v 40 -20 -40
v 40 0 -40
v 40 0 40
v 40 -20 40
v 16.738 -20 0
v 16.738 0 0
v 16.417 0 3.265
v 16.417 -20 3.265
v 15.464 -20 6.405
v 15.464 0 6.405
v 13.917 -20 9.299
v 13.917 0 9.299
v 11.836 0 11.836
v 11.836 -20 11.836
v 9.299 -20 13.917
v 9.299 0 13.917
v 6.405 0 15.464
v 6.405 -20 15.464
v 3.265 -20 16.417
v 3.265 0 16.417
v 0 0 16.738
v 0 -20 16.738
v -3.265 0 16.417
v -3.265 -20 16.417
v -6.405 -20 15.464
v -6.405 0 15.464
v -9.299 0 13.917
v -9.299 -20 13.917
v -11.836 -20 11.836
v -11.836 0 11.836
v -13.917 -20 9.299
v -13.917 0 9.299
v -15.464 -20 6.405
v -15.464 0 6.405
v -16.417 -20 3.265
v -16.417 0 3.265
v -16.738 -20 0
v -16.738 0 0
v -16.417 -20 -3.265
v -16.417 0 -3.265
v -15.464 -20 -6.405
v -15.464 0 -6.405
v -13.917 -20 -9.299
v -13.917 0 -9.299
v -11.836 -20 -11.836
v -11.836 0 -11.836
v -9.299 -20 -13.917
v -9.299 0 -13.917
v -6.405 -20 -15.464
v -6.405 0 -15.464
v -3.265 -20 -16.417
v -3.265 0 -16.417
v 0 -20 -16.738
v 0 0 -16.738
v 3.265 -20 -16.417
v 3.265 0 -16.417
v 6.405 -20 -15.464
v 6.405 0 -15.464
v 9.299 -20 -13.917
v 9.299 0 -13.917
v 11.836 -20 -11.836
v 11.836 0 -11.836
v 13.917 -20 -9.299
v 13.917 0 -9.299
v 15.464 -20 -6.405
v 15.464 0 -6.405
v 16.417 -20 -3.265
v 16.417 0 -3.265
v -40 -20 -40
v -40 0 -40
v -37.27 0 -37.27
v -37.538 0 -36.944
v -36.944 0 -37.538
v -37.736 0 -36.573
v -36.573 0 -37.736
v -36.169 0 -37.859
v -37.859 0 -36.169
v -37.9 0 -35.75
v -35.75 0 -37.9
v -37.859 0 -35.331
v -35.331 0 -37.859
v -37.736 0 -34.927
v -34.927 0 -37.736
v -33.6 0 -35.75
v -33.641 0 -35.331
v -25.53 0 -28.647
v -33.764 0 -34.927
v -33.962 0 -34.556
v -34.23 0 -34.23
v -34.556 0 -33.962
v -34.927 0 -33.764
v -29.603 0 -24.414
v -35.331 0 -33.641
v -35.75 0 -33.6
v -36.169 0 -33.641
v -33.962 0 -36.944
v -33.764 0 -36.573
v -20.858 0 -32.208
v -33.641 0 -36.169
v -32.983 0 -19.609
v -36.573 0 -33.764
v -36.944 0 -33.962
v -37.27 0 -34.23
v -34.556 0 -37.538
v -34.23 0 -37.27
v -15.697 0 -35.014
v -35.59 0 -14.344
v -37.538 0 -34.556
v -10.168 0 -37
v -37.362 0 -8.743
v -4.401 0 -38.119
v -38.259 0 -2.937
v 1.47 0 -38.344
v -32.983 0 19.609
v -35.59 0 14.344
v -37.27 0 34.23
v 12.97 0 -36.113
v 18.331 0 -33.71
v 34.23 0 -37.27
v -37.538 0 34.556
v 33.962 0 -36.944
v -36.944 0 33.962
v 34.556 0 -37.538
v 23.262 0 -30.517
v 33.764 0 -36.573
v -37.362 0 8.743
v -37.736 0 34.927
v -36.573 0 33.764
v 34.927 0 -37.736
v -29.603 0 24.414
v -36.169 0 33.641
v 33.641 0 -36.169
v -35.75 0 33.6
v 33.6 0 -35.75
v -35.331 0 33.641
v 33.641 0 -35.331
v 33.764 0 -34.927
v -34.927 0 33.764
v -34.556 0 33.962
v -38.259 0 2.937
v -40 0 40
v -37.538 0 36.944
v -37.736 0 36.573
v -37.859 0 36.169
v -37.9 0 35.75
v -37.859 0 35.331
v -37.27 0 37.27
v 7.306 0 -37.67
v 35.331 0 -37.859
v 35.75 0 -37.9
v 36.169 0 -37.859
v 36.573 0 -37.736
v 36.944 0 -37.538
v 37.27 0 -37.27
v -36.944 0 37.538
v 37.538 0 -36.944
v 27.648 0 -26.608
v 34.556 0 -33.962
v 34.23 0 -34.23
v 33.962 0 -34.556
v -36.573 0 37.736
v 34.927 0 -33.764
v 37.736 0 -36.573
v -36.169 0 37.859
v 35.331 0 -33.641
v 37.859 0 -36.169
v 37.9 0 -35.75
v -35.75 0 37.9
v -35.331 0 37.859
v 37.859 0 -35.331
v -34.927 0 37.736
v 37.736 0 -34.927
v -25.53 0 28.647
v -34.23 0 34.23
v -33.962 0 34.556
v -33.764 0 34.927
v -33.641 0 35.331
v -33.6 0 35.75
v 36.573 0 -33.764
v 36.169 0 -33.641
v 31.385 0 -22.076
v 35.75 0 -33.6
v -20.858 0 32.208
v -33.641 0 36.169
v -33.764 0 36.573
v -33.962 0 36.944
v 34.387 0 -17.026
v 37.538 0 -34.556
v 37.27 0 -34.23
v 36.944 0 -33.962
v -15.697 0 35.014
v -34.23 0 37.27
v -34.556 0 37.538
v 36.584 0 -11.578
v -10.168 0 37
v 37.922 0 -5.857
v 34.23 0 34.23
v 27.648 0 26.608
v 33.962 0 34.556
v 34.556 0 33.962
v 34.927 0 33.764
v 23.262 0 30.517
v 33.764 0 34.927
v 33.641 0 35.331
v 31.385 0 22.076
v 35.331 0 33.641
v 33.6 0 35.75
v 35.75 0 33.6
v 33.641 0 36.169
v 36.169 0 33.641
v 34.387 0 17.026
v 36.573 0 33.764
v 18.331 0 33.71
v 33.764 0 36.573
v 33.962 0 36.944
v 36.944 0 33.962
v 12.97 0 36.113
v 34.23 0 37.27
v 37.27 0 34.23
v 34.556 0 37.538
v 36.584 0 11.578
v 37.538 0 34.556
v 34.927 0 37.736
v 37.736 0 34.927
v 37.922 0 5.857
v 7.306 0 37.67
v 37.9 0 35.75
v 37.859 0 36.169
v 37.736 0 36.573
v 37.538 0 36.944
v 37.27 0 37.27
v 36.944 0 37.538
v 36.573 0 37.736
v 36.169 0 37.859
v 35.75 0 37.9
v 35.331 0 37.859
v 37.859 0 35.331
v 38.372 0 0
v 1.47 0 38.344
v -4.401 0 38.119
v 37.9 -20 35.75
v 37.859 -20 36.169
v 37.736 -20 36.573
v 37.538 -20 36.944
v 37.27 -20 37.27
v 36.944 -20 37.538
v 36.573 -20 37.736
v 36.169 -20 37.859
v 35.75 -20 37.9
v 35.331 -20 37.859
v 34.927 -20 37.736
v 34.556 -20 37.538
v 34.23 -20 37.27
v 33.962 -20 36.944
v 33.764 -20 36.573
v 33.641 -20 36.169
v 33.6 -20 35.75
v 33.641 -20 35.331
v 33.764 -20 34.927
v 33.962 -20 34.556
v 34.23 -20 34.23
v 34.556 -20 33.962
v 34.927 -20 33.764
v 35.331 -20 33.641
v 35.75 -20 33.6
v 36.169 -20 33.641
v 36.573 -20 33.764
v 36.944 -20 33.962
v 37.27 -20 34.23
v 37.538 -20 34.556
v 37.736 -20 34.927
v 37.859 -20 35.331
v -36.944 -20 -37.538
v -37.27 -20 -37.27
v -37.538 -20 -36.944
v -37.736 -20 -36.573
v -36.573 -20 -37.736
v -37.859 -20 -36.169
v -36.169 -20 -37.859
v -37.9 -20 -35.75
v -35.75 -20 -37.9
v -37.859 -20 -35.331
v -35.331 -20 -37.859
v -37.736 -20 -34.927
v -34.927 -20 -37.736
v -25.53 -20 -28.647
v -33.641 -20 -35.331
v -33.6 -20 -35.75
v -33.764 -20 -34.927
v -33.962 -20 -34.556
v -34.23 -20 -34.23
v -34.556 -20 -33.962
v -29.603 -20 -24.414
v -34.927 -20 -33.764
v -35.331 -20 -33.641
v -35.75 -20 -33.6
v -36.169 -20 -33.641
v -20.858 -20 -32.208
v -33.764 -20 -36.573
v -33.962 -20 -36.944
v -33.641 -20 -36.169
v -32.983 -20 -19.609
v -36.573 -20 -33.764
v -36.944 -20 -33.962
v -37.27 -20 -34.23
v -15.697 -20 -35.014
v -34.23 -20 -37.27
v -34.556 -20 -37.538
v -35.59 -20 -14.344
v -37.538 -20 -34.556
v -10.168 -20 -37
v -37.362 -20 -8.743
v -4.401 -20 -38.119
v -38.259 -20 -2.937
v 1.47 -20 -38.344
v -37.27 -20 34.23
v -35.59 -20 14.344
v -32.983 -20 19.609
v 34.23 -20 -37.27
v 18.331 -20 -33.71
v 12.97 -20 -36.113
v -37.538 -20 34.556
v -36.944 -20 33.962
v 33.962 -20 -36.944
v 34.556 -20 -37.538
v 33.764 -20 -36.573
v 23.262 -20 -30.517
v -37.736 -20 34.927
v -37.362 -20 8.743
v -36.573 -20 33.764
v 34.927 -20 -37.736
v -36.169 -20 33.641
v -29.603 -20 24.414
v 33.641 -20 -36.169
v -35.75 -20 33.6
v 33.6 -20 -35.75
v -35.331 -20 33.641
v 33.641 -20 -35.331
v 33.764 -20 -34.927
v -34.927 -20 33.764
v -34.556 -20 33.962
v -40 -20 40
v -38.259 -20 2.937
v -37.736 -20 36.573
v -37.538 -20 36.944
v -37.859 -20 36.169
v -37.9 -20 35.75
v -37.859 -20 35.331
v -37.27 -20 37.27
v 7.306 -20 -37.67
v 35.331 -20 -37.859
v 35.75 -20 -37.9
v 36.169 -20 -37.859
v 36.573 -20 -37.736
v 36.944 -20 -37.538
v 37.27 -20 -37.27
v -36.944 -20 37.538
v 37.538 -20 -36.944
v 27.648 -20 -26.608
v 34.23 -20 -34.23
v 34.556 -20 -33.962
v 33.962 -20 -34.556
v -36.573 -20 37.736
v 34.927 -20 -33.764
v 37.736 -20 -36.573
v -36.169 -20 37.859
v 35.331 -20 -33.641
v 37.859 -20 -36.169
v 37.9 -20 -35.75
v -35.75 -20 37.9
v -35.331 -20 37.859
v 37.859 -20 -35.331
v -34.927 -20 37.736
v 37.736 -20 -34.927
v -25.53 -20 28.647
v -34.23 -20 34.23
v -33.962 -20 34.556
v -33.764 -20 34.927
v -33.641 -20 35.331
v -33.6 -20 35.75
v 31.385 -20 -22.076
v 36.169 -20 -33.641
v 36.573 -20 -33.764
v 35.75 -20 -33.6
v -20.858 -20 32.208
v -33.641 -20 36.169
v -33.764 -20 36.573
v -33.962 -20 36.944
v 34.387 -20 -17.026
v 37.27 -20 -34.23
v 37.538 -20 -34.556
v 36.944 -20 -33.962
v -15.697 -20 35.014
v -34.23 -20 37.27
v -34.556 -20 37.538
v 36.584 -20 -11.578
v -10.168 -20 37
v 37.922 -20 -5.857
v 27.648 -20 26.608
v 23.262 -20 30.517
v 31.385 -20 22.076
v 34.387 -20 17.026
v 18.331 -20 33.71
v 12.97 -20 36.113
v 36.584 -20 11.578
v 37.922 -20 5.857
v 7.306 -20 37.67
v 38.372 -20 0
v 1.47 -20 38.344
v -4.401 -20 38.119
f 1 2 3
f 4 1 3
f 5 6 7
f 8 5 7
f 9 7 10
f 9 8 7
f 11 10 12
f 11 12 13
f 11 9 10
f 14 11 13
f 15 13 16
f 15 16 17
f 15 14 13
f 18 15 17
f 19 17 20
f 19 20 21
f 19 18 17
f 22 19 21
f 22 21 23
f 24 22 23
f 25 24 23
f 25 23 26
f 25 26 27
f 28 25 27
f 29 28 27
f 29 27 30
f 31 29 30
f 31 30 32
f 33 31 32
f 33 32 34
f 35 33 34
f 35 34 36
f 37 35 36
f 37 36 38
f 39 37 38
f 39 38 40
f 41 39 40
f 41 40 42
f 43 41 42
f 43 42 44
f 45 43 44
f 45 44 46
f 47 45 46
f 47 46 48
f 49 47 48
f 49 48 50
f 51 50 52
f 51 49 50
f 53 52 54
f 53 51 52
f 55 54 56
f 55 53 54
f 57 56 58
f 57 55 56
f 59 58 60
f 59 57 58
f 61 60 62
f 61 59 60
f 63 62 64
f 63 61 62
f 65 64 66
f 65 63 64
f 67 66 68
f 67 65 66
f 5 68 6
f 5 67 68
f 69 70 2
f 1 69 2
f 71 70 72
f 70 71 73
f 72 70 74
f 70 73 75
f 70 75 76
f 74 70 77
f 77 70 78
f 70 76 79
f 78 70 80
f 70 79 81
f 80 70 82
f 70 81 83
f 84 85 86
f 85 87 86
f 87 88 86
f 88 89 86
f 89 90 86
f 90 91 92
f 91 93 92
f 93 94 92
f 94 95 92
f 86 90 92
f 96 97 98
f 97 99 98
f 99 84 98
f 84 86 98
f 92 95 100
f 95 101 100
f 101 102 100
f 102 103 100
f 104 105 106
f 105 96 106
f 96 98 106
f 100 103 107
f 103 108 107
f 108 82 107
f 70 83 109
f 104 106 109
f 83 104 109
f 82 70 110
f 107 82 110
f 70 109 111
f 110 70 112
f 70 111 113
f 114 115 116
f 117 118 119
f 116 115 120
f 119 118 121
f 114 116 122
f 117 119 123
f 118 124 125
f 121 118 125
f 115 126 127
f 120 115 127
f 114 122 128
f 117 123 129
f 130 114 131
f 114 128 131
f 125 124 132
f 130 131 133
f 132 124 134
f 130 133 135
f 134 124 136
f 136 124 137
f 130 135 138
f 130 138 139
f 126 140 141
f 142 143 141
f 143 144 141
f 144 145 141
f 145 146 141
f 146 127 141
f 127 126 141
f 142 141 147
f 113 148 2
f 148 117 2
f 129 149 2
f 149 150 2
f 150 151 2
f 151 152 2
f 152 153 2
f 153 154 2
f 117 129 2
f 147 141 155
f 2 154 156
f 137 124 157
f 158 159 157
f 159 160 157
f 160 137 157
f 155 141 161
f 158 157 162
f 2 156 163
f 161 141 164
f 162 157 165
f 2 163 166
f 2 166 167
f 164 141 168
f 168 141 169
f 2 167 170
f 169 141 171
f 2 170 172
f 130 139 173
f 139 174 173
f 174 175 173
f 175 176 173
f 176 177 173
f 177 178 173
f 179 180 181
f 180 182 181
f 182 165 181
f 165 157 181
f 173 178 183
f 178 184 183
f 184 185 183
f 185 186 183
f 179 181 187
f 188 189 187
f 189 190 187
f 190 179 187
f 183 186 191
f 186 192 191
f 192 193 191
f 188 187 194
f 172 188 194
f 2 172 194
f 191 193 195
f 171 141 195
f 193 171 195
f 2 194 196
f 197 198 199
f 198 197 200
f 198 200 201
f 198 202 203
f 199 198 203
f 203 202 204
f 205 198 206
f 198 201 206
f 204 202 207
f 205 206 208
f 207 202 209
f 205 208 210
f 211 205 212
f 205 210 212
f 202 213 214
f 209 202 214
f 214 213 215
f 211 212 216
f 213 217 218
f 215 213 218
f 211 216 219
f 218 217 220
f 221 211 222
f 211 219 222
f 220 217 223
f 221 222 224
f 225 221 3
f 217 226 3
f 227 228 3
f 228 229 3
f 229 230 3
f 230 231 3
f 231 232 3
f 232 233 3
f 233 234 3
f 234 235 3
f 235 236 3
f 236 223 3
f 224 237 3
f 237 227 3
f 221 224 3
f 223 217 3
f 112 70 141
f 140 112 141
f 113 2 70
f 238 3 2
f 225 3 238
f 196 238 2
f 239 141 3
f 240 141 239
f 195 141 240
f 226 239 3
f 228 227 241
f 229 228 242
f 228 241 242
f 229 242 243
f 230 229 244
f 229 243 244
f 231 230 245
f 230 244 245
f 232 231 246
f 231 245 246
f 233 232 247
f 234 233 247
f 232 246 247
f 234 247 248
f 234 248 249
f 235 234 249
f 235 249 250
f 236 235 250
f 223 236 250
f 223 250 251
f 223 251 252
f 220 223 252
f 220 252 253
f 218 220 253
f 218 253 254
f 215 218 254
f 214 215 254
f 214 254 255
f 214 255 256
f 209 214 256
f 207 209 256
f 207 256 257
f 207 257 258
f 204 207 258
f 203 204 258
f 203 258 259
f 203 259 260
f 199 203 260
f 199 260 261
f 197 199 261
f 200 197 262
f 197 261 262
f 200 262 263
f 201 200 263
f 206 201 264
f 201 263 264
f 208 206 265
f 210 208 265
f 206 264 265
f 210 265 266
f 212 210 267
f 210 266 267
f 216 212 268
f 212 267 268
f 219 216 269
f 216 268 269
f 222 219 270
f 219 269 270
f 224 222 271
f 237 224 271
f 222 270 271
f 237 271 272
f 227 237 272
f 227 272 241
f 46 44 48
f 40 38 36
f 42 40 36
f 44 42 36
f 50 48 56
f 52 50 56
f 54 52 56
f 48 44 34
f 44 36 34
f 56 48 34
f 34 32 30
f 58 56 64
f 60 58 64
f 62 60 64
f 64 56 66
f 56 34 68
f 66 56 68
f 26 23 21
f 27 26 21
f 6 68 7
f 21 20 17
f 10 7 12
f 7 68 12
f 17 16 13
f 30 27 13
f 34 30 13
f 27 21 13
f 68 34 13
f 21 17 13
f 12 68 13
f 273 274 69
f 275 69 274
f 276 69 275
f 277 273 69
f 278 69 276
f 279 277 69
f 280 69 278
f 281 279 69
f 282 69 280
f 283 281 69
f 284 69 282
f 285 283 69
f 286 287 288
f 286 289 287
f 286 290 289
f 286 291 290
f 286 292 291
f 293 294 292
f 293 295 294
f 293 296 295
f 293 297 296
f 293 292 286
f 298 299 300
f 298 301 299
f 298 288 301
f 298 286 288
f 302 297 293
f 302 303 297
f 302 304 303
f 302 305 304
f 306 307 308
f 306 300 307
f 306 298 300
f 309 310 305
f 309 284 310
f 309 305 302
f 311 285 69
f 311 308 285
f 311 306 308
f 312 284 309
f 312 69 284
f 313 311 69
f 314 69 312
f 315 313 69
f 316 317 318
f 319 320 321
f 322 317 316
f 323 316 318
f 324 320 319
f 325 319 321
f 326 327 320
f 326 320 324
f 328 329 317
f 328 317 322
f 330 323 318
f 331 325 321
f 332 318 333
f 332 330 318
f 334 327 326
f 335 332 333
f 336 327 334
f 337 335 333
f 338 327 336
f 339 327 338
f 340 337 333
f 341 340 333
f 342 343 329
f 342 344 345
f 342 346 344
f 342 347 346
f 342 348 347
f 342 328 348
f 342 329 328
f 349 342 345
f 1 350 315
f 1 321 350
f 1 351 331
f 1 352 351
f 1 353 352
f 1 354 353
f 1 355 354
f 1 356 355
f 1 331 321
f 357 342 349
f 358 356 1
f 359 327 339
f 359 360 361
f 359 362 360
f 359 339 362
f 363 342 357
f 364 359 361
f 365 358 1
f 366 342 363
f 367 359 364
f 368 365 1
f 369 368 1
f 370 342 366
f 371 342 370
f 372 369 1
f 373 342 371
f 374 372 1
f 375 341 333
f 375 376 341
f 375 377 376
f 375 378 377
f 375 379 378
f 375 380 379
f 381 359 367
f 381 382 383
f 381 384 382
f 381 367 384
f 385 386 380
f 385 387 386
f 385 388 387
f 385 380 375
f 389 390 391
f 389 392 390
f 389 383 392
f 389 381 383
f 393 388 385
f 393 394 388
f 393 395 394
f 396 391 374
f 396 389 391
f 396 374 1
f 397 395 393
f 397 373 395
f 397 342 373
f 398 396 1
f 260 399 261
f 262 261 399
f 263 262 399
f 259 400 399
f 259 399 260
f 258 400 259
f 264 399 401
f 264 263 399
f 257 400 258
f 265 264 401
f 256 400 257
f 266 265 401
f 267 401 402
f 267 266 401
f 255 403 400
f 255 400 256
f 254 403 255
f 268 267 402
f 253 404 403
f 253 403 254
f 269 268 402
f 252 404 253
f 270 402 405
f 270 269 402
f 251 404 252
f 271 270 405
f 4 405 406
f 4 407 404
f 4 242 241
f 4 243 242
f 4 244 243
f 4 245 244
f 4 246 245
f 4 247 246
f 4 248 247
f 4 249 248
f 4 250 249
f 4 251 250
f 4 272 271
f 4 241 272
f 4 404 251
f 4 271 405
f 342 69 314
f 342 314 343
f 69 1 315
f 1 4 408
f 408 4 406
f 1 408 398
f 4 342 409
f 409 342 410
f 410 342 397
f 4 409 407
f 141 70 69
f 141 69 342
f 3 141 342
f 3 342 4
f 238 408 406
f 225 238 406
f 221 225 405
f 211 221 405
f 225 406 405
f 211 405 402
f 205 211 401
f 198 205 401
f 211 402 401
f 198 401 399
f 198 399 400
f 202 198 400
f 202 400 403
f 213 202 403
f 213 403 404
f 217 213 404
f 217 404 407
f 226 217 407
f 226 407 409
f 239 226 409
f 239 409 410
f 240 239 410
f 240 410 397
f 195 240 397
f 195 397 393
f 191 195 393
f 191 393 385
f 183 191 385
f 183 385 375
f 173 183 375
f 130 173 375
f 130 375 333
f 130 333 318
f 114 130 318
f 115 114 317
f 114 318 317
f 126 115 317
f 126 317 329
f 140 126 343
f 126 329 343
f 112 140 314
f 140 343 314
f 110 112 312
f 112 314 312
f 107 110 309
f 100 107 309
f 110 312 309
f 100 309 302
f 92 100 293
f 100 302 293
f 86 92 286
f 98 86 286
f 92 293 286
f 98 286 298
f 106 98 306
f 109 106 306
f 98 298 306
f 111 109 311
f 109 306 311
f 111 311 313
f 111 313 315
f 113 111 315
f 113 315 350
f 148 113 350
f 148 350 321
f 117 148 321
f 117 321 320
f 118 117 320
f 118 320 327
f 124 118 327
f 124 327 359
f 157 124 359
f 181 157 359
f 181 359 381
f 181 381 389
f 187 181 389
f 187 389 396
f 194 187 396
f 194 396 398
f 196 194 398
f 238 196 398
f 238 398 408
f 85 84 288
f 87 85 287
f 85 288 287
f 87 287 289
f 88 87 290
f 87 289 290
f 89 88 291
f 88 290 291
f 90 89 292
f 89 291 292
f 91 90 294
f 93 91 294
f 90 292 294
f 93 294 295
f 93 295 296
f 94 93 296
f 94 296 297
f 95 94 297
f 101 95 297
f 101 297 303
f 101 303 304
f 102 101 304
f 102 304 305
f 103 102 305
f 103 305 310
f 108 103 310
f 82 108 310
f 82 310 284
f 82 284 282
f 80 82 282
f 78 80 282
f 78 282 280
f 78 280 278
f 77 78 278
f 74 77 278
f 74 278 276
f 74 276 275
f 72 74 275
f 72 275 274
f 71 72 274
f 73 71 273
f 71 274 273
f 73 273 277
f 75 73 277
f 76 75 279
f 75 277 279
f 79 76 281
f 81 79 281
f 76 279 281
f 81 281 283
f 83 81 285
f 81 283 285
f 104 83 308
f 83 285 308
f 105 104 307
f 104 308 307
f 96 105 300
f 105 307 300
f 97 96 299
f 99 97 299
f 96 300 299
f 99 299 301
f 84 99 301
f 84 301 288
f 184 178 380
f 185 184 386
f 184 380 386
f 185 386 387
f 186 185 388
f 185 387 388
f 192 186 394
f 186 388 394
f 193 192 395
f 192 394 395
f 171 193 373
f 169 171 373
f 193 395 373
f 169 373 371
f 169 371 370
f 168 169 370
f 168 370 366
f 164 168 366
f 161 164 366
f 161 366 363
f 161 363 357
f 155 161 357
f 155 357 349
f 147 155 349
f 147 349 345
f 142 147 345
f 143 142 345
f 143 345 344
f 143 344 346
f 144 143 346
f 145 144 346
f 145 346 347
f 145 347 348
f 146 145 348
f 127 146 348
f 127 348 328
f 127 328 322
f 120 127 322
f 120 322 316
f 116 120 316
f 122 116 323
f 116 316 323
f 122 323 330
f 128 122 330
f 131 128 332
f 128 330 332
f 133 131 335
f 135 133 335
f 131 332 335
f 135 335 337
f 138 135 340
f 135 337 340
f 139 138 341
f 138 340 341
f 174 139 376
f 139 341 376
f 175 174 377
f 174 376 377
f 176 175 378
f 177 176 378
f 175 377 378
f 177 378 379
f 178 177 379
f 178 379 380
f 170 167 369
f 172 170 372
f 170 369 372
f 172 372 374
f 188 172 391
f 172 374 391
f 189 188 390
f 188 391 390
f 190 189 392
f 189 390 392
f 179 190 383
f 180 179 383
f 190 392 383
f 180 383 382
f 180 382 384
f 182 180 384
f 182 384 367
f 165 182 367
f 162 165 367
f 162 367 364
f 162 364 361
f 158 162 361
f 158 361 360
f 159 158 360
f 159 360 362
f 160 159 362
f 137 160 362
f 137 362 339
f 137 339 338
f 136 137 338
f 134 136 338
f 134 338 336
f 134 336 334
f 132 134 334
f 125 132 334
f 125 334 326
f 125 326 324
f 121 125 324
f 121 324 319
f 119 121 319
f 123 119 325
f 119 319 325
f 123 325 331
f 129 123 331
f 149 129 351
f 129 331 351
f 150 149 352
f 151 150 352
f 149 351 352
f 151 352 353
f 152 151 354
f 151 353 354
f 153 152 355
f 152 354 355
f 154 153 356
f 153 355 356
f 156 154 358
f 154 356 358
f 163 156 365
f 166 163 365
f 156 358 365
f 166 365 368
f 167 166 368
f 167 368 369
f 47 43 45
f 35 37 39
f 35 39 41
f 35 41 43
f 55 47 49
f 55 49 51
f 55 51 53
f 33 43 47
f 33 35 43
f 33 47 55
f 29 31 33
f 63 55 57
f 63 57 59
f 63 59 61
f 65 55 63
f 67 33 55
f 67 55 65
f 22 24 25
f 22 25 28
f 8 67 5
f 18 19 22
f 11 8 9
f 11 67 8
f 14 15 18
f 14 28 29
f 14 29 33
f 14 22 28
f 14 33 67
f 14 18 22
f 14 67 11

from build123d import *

# Parameters (mm, degrees)
F0_W     = 80
F0_H     = 80
F1_DEPTH = 20
F2_R     = 2.15
F3_DEPTH = 25
F4_R     = 38.371793
F4_R_2   = 16.738332
F5_DEPTH = 25


with BuildPart() as f1:
    # F0 (on Front) → F1 (new body)
    with BuildSketch(Plane.XZ):
        Rectangle(F0_W, F0_H)
    extrude(amount=F1_DEPTH)

    # F2 (on face) → F3 (cut)
    with BuildSketch(Plane.XZ.offset(20)):
        with Locations((-35.75, 35.75)):
            Circle(F2_R)
        with Locations((-35.75, -35.75)):
            Circle(F2_R)
        with Locations((35.75, 35.75)):
            Circle(F2_R)
        with Locations((35.75, -35.75)):
            Circle(F2_R)
    extrude(amount=-F3_DEPTH, mode=Mode.SUBTRACT)

    # F4 (on face) → F5 (cut)
    with BuildSketch(Plane.XZ.offset(20)):
        Circle(F4_R)
        Circle(F4_R_2, mode=Mode.SUBTRACT)
    extrude(amount=-F5_DEPTH, mode=Mode.SUBTRACT)


solid = f1.part
